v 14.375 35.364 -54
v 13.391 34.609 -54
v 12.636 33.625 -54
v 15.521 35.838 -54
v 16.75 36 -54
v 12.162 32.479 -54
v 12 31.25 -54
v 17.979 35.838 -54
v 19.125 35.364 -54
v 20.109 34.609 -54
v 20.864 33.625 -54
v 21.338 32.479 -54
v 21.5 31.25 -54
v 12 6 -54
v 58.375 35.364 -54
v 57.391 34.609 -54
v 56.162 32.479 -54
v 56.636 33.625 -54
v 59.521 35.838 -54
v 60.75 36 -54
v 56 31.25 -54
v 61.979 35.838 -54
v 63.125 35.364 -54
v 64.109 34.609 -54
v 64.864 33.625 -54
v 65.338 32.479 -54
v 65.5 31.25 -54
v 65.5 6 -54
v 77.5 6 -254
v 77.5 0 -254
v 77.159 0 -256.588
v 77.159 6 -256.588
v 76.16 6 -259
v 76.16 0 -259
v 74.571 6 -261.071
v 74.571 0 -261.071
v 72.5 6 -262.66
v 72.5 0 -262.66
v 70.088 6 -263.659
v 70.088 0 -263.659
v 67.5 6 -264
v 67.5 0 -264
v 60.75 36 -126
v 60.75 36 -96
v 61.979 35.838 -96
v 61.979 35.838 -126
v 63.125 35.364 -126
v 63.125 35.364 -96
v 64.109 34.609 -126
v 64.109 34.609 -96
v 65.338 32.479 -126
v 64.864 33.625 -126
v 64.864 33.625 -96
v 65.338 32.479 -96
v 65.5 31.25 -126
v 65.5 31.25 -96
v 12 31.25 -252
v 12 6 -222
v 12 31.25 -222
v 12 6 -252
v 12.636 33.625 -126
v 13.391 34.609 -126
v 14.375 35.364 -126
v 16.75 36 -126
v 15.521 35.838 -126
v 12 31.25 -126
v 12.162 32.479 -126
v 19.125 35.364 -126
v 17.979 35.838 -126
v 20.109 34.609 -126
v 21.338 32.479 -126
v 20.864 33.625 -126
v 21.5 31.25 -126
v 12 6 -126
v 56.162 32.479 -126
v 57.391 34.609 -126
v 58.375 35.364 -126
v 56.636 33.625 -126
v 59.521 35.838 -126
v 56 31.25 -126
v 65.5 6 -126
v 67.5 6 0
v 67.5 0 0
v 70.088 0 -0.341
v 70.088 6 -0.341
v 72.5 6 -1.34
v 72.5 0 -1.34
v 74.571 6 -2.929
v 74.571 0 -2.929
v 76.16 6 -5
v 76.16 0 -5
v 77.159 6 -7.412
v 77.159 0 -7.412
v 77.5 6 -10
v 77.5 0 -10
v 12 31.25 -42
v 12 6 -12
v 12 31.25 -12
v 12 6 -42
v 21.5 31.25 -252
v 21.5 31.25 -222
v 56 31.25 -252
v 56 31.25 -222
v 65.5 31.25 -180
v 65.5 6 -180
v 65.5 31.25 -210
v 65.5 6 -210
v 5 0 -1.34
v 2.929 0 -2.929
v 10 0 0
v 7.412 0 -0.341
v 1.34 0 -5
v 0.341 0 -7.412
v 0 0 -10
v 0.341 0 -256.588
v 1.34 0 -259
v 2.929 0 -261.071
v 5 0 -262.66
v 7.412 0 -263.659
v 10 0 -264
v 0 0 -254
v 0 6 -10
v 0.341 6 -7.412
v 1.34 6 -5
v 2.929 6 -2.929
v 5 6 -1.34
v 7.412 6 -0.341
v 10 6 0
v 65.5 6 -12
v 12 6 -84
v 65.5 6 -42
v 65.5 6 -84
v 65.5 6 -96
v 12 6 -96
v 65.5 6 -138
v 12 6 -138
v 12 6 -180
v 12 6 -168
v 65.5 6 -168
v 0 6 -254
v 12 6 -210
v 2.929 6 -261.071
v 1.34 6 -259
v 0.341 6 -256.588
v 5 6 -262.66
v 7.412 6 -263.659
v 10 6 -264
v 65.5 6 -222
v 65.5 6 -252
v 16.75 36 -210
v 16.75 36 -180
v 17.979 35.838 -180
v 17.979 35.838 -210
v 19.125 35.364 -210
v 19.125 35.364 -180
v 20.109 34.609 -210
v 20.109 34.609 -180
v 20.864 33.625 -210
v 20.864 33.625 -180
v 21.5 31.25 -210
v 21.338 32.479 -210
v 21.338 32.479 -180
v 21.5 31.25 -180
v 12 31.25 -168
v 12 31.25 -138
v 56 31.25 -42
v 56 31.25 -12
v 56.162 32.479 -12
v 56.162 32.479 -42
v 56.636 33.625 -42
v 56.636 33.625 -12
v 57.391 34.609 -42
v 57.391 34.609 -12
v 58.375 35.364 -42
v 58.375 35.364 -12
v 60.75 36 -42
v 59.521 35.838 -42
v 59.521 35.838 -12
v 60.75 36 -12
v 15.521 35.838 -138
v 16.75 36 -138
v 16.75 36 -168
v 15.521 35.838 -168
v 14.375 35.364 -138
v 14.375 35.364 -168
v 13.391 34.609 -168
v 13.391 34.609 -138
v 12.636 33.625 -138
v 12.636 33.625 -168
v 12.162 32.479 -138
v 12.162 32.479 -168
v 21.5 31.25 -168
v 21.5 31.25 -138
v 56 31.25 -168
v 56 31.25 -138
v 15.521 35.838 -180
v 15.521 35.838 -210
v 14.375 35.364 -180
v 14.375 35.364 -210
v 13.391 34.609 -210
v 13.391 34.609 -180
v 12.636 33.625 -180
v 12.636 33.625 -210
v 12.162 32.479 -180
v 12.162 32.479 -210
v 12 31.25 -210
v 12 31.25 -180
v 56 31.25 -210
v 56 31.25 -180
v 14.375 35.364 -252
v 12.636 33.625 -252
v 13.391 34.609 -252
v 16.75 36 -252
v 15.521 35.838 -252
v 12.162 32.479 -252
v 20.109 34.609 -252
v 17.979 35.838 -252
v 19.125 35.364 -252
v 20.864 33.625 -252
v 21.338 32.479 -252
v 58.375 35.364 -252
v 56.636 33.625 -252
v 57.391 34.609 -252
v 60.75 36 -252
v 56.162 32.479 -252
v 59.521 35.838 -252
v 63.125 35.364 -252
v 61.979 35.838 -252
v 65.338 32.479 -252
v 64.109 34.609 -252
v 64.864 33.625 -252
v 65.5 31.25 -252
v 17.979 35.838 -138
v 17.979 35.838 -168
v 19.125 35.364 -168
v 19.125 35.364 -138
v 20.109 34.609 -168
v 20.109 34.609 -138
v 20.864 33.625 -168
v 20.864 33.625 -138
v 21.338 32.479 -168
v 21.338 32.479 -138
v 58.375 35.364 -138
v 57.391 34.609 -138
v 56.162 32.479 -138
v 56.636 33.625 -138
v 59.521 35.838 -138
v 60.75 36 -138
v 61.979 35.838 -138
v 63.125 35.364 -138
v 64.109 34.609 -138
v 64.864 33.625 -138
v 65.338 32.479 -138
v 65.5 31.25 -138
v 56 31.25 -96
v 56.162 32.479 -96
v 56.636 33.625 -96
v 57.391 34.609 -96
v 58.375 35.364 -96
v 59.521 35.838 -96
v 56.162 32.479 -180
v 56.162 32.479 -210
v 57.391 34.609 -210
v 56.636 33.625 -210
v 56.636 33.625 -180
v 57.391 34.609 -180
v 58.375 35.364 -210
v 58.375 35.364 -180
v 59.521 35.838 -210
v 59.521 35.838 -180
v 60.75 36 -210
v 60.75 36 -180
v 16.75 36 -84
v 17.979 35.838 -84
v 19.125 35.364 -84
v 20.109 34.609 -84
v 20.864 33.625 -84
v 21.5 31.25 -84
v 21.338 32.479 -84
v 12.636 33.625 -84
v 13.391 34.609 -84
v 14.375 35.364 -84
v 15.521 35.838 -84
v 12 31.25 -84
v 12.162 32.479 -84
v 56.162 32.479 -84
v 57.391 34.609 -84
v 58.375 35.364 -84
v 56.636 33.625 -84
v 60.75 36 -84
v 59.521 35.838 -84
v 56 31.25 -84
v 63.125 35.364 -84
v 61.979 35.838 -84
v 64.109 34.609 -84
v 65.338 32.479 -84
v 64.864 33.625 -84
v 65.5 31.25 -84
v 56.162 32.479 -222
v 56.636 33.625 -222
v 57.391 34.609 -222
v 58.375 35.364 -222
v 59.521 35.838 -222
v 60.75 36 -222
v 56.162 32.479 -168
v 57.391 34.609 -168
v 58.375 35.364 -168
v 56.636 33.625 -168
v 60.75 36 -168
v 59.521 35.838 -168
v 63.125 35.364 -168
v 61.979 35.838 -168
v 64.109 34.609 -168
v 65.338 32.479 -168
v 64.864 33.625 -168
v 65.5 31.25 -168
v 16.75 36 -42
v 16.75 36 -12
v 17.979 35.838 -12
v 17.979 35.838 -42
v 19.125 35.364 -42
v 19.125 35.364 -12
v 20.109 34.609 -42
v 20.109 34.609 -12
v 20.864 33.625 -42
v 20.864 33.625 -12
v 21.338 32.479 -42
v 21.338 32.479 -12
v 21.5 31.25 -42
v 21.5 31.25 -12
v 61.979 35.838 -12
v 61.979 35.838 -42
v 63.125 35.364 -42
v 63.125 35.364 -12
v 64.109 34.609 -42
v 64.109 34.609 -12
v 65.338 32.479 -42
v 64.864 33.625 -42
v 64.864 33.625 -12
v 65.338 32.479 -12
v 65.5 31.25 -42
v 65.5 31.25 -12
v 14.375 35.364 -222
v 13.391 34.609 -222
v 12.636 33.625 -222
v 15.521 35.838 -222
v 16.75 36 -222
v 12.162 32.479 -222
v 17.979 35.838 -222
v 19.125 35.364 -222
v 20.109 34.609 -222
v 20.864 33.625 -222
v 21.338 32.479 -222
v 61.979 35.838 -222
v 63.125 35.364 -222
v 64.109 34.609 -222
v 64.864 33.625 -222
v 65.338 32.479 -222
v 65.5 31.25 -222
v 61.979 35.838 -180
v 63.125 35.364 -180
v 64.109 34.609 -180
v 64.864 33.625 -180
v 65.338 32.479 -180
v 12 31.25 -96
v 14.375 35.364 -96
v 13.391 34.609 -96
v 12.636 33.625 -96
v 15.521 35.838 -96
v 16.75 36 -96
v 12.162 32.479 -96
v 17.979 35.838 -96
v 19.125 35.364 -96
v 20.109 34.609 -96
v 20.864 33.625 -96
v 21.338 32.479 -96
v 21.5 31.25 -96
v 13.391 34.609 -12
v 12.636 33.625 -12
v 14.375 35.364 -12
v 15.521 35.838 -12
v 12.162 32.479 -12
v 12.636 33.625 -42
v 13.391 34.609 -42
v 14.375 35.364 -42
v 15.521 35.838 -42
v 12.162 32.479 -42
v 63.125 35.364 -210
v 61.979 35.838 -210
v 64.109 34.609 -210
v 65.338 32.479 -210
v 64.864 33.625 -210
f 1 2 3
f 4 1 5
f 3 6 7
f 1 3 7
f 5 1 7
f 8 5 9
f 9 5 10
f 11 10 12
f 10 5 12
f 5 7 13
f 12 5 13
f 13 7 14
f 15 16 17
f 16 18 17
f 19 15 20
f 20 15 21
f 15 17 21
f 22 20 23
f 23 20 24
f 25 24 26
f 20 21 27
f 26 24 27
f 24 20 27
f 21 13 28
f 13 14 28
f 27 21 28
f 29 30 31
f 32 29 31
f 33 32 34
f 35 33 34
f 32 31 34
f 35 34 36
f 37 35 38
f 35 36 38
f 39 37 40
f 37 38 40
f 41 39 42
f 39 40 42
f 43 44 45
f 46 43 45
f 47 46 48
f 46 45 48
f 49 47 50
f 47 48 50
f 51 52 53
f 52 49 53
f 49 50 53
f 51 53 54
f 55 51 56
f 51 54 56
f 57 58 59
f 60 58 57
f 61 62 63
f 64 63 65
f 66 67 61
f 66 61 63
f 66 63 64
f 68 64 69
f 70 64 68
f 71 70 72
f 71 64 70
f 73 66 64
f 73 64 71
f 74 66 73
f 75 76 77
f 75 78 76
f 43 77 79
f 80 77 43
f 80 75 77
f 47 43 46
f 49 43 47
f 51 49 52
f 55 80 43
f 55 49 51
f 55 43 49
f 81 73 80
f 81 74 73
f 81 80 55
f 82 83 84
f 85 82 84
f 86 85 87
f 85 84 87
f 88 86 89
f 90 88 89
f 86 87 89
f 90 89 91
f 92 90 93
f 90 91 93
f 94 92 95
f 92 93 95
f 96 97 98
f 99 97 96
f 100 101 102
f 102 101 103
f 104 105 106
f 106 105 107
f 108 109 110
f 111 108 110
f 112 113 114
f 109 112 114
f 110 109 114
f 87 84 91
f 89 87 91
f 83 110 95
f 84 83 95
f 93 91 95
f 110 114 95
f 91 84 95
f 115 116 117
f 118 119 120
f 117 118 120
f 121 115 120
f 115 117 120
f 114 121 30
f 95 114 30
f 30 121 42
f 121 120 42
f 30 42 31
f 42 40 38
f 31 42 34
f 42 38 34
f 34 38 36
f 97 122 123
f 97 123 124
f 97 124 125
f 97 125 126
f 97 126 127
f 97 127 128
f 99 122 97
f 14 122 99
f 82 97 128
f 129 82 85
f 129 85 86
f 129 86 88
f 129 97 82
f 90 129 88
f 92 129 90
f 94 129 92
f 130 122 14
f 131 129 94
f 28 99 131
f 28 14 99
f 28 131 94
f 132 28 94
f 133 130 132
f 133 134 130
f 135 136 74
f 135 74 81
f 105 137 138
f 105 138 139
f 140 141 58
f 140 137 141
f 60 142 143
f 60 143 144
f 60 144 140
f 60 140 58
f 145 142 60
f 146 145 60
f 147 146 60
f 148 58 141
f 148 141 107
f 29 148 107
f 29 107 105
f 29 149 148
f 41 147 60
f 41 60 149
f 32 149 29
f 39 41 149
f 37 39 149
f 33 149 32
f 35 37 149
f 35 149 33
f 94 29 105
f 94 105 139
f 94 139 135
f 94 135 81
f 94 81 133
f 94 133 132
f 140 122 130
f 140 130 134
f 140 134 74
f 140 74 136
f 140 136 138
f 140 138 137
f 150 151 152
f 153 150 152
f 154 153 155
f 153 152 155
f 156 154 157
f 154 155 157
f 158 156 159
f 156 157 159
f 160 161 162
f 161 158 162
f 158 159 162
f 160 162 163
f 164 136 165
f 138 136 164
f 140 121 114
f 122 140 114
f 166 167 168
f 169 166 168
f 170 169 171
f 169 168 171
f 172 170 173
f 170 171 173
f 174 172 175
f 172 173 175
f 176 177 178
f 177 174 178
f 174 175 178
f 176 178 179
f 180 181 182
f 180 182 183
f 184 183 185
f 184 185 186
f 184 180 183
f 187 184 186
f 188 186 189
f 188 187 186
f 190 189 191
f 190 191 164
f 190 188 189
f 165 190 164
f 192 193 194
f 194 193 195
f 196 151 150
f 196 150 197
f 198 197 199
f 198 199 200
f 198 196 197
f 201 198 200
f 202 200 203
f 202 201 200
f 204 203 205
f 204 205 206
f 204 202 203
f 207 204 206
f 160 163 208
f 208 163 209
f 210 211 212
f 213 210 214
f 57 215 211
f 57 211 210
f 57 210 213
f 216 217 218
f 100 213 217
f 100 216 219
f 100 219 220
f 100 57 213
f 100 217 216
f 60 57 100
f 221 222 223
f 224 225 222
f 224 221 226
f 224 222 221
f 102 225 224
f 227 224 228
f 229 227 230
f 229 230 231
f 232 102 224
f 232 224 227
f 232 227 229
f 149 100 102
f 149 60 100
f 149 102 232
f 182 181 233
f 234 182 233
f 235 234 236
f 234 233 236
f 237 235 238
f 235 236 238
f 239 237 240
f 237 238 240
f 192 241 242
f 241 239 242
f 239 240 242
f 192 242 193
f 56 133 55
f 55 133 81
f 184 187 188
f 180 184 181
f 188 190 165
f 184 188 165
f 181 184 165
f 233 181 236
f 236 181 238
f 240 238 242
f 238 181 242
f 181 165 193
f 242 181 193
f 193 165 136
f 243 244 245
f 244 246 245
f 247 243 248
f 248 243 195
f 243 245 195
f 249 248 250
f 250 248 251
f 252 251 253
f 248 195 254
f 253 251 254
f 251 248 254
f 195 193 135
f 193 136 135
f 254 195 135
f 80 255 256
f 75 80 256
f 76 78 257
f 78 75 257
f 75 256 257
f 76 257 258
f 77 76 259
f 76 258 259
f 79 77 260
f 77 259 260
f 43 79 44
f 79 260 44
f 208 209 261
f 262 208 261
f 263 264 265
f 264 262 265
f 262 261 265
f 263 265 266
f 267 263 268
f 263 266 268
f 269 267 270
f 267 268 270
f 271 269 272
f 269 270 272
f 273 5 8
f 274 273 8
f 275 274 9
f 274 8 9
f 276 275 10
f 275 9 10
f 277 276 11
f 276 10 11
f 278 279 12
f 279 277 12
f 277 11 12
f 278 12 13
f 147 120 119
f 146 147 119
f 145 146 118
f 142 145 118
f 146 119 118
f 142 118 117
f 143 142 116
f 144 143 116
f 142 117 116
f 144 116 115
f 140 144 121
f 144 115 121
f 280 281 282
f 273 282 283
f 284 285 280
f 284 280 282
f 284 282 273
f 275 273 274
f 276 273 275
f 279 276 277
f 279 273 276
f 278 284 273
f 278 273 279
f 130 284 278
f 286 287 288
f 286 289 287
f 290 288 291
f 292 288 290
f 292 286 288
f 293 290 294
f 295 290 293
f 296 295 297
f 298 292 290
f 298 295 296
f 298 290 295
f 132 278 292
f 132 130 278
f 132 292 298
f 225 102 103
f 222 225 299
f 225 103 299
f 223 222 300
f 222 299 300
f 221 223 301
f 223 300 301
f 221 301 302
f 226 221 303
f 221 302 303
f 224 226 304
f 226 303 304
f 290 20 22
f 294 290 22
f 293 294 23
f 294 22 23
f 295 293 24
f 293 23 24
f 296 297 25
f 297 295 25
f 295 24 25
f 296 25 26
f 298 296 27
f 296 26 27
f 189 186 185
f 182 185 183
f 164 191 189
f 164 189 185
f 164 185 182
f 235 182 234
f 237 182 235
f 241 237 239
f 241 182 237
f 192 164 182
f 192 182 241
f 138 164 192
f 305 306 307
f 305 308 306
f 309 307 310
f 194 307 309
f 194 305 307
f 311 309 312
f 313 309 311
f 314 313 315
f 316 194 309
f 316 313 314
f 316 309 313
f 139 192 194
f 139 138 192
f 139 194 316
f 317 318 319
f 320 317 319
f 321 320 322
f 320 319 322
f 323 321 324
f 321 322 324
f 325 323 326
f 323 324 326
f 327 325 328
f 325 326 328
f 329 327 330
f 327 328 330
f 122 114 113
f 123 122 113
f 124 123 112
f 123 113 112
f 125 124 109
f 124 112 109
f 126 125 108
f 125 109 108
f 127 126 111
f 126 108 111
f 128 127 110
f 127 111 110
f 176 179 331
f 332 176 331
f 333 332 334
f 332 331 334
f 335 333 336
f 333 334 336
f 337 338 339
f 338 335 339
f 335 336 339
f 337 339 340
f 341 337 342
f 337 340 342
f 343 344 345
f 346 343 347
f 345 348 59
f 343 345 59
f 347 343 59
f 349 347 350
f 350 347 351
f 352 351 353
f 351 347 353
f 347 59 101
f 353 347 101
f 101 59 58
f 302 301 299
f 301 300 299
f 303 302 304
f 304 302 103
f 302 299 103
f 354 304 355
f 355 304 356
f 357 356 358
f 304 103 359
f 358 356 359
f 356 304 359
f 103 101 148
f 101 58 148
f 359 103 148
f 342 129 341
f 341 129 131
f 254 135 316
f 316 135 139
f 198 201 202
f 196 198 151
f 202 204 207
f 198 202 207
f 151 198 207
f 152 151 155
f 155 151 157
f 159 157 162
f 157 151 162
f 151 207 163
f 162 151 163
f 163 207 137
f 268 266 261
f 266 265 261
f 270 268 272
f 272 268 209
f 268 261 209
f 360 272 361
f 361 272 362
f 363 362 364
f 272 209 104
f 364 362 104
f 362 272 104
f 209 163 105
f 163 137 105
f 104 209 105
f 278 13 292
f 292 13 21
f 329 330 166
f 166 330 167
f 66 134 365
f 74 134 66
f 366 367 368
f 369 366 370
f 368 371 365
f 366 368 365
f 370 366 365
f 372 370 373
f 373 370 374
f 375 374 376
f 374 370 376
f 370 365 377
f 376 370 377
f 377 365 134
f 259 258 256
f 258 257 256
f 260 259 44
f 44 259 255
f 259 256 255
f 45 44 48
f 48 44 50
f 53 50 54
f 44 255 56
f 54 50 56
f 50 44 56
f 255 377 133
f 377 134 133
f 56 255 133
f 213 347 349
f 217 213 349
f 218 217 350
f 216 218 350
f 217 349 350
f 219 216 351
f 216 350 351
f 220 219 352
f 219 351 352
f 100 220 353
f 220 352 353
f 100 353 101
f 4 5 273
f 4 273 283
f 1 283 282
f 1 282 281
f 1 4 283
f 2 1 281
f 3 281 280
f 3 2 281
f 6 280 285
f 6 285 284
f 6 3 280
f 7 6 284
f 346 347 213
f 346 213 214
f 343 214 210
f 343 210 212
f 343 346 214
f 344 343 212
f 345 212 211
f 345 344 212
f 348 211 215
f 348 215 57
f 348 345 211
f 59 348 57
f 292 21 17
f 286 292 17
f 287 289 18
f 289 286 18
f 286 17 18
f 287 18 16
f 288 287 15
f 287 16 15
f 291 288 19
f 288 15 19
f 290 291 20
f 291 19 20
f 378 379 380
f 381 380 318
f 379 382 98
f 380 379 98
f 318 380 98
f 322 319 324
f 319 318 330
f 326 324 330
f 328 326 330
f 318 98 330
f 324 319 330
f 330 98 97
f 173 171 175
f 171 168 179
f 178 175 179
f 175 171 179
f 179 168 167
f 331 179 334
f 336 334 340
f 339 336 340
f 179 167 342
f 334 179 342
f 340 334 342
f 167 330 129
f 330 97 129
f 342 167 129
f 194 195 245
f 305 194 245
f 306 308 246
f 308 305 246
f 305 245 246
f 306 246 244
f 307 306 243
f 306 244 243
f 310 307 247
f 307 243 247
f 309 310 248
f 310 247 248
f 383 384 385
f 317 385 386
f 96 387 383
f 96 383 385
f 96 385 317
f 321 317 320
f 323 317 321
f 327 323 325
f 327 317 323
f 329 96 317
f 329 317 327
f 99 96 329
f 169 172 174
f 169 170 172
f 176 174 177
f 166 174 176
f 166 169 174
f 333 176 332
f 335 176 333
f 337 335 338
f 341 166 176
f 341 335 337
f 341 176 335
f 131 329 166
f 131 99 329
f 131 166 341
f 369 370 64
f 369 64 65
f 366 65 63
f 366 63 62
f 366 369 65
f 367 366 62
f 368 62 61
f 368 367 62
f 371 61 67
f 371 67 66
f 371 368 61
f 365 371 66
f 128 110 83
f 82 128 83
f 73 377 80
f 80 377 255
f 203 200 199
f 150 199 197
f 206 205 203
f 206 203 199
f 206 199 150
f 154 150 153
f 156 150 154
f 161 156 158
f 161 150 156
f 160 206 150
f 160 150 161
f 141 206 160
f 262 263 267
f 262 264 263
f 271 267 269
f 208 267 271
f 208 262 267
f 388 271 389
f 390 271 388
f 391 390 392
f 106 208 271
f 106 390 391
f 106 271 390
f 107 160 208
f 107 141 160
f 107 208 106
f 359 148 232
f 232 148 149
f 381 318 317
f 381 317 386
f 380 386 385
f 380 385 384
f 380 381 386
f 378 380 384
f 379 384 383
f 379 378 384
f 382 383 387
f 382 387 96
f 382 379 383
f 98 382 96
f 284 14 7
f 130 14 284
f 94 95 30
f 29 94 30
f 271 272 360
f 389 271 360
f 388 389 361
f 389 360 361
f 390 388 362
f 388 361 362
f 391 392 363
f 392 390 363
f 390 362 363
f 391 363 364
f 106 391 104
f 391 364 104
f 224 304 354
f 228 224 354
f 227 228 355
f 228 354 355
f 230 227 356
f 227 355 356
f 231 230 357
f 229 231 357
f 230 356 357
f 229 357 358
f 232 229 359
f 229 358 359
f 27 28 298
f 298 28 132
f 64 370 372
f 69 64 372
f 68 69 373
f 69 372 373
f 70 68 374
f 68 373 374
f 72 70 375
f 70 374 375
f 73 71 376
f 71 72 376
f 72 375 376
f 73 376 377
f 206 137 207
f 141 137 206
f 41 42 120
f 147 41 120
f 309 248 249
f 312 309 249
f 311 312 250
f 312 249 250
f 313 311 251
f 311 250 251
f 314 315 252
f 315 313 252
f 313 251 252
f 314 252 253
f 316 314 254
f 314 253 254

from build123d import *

# Parameters (mm, degrees)
BOSS_EXTRUDE1_DEPTH = 6
SKETCH3_W           = 53.5
SKETCH3_H           = 30
BOSS_EXTRUDE2_DEPTH = 30
SKETCH4_W           = 34.5
SKETCH4_H           = 4.75
CUT_EXTRUDE1_DEPTH  = 240


with BuildPart() as part:
    # Sketch2 → Boss-Extrude1 (new body)
    with BuildSketch(Plane(origin=(0, 0, 0), x_dir=(1, 0, 0), z_dir=(0, 1, 0))):
        with BuildLine():
            Line((10, 0), (67.5, 0))
            ThreePointArc((67.5, 0), (74.571067812, 2.928932188), (77.5, 10))
            Line((77.5, 10), (77.5, 254))
            ThreePointArc((77.5, 254), (74.571067812, 261.071067812), (67.5, 264))
            Line((67.5, 264), (10, 264))
            ThreePointArc((10, 264), (2.928932188, 261.071067812), (0, 254))
            Line((0, 254), (0, 10))
            ThreePointArc((0, 10), (2.928932188, 2.928932188), (10, 0))
        make_face()
    extrude(amount=BOSS_EXTRUDE1_DEPTH)

    # Sketch3 → Boss-Extrude2 (add)
    with BuildSketch(Plane(origin=(0, 6, 0), x_dir=(1, 0, 0), z_dir=(0, 1, 0))):
        with Locations((38.75, 27)):
            Rectangle(SKETCH3_W, SKETCH3_H)
        with Locations((38.75, 69)):
            Rectangle(SKETCH3_W, SKETCH3_H)
        with Locations((38.75, 111)):
            Rectangle(SKETCH3_W, SKETCH3_H)
        with Locations((38.75, 237)):
            Rectangle(SKETCH3_W, SKETCH3_H)
        with Locations((38.75, 195)):
            Rectangle(SKETCH3_W, SKETCH3_H)
        with Locations((38.75, 153)):
            Rectangle(SKETCH3_W, SKETCH3_H)
    extrude(amount=BOSS_EXTRUDE2_DEPTH)

    # Sketch4 → Cut-Extrude1 (cut)
    with BuildSketch(Plane.XY.offset(-12)):
        with BuildLine():
            Line((21.5, 36), (16.75, 36))
            ThreePointArc((16.75, 36), (20.108757211, 34.608757211), (21.5, 31.25))
            Line((21.5, 31.25), (21.5, 36))
        make_face()
        with Locations((38.75, 33.625)):
            Rectangle(SKETCH4_W, SKETCH4_H)
        with BuildLine():
            Line((56, 36), (56, 31.25))
            ThreePointArc((56, 31.25), (57.391242789, 34.608757211), (60.75, 36))
            Line((60.75, 36), (56, 36))
        make_face()
        with BuildLine():
            Line((65.5, 36), (60.75, 36))
            ThreePointArc((60.75, 36), (64.108757211, 34.608757211), (65.5, 31.25))
            Line((65.5, 31.25), (65.5, 36))
        make_face()
        with BuildLine():
            Line((12, 36), (16.75, 36))
            ThreePointArc((16.75, 36), (13.391242789, 34.608757211), (12, 31.25))
            Line((12, 31.25), (12, 36))
        make_face()
    extrude(amount=-CUT_EXTRUDE1_DEPTH, mode=Mode.SUBTRACT)


solid = part.part
